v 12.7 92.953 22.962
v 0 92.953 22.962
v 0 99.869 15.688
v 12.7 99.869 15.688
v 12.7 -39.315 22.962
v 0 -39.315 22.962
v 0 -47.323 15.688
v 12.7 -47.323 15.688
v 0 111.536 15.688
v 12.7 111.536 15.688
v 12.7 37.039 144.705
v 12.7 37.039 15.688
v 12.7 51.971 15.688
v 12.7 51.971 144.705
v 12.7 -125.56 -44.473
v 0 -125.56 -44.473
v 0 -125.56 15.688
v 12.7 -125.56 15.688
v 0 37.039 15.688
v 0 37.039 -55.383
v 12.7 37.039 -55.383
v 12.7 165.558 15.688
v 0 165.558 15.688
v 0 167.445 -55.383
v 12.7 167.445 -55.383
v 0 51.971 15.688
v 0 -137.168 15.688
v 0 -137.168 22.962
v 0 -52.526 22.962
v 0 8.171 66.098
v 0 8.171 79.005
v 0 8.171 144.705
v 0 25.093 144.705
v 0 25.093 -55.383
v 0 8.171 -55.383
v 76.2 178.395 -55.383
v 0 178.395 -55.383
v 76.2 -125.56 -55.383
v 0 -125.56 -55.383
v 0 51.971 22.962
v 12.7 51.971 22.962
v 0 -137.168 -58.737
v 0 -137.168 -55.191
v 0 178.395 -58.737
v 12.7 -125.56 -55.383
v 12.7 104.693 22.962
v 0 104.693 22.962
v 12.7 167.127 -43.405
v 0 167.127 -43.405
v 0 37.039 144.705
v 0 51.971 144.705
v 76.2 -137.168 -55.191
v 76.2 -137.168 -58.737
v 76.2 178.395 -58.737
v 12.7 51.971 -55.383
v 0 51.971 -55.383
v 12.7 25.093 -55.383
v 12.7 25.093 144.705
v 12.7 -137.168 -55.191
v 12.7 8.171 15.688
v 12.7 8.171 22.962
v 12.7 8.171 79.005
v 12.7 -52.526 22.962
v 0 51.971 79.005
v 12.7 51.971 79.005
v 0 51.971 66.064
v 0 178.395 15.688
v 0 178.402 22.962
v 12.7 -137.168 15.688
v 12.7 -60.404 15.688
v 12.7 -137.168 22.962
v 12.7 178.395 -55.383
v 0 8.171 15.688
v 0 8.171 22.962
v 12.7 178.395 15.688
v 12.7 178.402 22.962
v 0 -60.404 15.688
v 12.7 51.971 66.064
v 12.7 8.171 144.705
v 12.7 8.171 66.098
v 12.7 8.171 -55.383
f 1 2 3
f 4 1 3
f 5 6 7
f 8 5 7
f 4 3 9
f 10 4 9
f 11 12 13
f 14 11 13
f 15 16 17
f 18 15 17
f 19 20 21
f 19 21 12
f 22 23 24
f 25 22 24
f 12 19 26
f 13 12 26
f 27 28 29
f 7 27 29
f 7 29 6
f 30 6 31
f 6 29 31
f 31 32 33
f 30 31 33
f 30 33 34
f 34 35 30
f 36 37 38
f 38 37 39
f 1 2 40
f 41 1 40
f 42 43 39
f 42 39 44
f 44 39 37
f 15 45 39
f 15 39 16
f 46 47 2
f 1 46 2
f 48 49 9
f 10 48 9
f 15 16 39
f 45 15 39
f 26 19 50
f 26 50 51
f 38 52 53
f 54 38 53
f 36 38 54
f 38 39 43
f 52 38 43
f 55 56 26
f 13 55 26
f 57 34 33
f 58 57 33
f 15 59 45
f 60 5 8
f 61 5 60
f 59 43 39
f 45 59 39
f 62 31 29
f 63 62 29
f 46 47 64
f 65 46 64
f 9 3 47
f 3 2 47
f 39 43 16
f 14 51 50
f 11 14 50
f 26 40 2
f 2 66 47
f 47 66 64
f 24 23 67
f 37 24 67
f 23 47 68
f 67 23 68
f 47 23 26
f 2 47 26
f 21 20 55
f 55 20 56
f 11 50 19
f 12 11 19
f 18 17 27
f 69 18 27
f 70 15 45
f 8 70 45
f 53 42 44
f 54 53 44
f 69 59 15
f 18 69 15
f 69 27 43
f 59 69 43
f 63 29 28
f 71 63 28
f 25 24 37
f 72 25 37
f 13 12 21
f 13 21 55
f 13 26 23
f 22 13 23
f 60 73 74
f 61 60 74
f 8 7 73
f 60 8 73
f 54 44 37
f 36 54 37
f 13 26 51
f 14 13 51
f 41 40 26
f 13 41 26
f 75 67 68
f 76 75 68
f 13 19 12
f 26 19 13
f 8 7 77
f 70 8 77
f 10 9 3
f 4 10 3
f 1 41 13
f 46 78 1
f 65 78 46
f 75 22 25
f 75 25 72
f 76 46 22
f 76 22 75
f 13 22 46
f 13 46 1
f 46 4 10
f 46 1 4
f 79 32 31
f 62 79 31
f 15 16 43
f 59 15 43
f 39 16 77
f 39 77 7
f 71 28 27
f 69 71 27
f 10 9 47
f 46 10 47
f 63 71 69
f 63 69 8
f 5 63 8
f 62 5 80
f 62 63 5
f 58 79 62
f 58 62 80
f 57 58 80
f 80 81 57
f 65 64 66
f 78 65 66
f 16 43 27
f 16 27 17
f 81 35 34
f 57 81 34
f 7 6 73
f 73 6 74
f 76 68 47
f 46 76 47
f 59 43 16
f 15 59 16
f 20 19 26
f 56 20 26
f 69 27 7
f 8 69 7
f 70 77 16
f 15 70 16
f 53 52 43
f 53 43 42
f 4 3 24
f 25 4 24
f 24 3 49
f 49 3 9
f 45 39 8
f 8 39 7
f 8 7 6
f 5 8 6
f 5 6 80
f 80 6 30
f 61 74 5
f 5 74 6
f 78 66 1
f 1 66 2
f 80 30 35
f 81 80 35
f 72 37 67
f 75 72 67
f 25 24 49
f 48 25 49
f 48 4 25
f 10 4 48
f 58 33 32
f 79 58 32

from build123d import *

# Parameters (mm, degrees)
F1_DEPTH = 12.7
F0_W     = 14.9319469929
F0_H     = 71.0706394166
F0_W_2   = 16.9228613377
F2_DEPTH = 12.7
F3_DEPTH = 12.7
F4_DEPTH = 12.7
F5_DEPTH = 76.2


with BuildPart() as f1:
    # F0 (on Right) → F1 (new body)
    with BuildSketch(Plane.YZ):
        Polygon((178.3947199583, -55.3829222918), (178.3947199583, 15.6877171248), (165.5580401421, 15.6877171248), (167.1266760885, -43.4050809947), align=None)
        Polygon((167.4446314573, -55.3829222918), (178.3947199583, -55.3829222918), (167.1266760885, -43.4050809947), align=None)
        Polygon((165.5580401421, 15.6877171248), (178.3947199583, 15.6877171248), (178.4024387598, 22.9618363082), (104.6926099554, 22.9618363082), (111.5356705738, 15.6877171248), align=None)
        Polygon((51.9709587097, 15.6877171248), (99.8692675307, 15.6877171248), (92.9528917235, 22.9618363082), (51.9709587097, 22.9618363082), align=None)
        Polygon((92.9528917235, 22.9618363082), (104.6926099554, 22.9618363082), (51.9709587097, 79.0045335889), (51.9709587097, 66.0635232925), align=None)
        Polygon((99.8692675307, 15.6877171248), (111.5356705738, 15.6877171248), (104.6926099554, 22.9618363082), (92.9528917235, 22.9618363082), align=None)
    extrude(amount=F1_DEPTH)


with BuildPart() as f1b:
    # F0 (on Right) → F1, piece 2 (new body)
    with BuildSketch(Plane.YZ):
        with Locations((44.5049852133, -19.8476025835)):
            Rectangle(F0_W, F0_H)
    extrude(amount=F1_DEPTH)


with BuildPart() as f1c:
    # F0 (on Right) → F1, piece 3 (new body)
    with BuildSketch(Plane.YZ):
        with Locations((16.6320297867, -19.8476025835)):
            Rectangle(F0_W_2, F0_H)
        Polygon((8.1705991179, 15.6877171248), (25.0934604555, 15.6877171248), (25.0934604555, 144.7050720453), (8.1705991179, 144.7050720453), (8.1705991179, 79.0045335889), (8.1705991179, 66.0977810621), (8.1705991179, 22.9618363082), align=None)
        Polygon((8.1705991179, 79.0045335889), (-52.5257776907, 22.9618363082), (-39.315135823, 22.9618363082), (8.1705991179, 66.0977810621), align=None)
        Polygon((-60.4039259657, 15.6877171248), (-47.3227706956, 15.6877171248), (-39.315135823, 22.9618363082), (-52.5257776907, 22.9618363082), align=None)
        Polygon((-137.1677964926, 22.9618363082), (-137.1677964926, 15.6877171248), (-125.5601099881, 15.6877171248), (-60.4039259657, 15.6877171248), (-52.5257776907, 22.9618363082), align=None)
    extrude(amount=F1_DEPTH)


with BuildPart() as f2:
    # F0 (on Right) → F2 (new body)
    with BuildSketch(Plane.YZ):
        Polygon((51.9709587097, 66.0635232925), (51.9709587097, 79.0045335889), (51.9709587097, 144.7050720453), (37.0390117168, 144.7050720453), (37.0390117168, 15.6877171248), (51.9709587097, 15.6877171248), (51.9709587097, 22.9618363082), align=None)
    extrude(amount=F2_DEPTH)


with BuildPart() as f2b:
    # F0 (on Right) → F2, piece 2 (new body)
    with BuildSketch(Plane.YZ):
        Polygon((167.1266760885, -43.4050809947), (111.5356705738, 15.6877171248), (99.8692675307, 15.6877171248), (167.4446314573, -55.3829222918), align=None)
    extrude(amount=F2_DEPTH)


with BuildPart() as f2c:
    # F0 (on Right) → F2, piece 3 (new body)
    with BuildSketch(Plane.YZ):
        Polygon((-39.315135823, 22.9618363082), (-47.3227706956, 15.6877171248), (8.1705991179, 15.6877171248), (8.1705991179, 22.9618363082), align=None)
    extrude(amount=F2_DEPTH)


with BuildPart() as f2d:
    # F0 (on Right) → F2, piece 4 (new body)
    with BuildSketch(Plane.YZ):
        Polygon((-125.5601099881, -44.4728474613), (-125.5601099881, -55.3829222918), (-47.3227706956, 15.6877171248), (-60.4039259657, 15.6877171248), align=None)
    extrude(amount=F2_DEPTH)


with BuildPart() as f2e:
    # F0 (on Right) → F2, piece 5 (new body)
    with BuildSketch(Plane.YZ):
        Polygon((-137.1677964926, 15.6877171248), (-137.1677964926, -55.1905557513), (-125.5601099881, -44.4728474613), (-125.5601099881, 15.6877171248), align=None)
    extrude(amount=F2_DEPTH)


with BuildPart() as f3:
    # F0 (on Right) → F3 (new body)
    with BuildSketch(Plane.YZ):
        Polygon((99.8692675307, 15.6877171248), (111.5356705738, 15.6877171248), (104.6926099554, 22.9618363082), (92.9528917235, 22.9618363082), align=None)
    extrude(amount=F3_DEPTH)


with BuildPart() as f4:
    # F0 (on Right) → F4 (new body)
    with BuildSketch(Plane.YZ):
        Polygon((-125.5601099881, -44.4728474613), (-137.1677964926, -55.1905557513), (-125.5601099881, -55.3829222918), align=None)
    extrude(amount=F4_DEPTH)


with BuildPart() as f5:
    # F0 (on Right) → F5 (new body)
    with BuildSketch(Plane.YZ):
        Polygon((178.3947199583, -58.7369278073), (178.3947199583, -55.3829222918), (167.4446314573, -55.3829222918), (51.9709587097, -55.3829222918), (37.0390117168, -55.3829222918), (25.0934604555, -55.3829222918), (8.1705991179, -55.3829222918), (-125.5601099881, -55.3829222918), (-137.1677964926, -55.1905557513), (-137.1677964926, -58.7369278073), align=None)
    extrude(amount=F5_DEPTH)


solid = Compound([f1.part, f1b.part, f1c.part, f2.part, f2b.part, f2c.part, f2d.part, f2e.part, f3.part, f4.part, f5.part])
